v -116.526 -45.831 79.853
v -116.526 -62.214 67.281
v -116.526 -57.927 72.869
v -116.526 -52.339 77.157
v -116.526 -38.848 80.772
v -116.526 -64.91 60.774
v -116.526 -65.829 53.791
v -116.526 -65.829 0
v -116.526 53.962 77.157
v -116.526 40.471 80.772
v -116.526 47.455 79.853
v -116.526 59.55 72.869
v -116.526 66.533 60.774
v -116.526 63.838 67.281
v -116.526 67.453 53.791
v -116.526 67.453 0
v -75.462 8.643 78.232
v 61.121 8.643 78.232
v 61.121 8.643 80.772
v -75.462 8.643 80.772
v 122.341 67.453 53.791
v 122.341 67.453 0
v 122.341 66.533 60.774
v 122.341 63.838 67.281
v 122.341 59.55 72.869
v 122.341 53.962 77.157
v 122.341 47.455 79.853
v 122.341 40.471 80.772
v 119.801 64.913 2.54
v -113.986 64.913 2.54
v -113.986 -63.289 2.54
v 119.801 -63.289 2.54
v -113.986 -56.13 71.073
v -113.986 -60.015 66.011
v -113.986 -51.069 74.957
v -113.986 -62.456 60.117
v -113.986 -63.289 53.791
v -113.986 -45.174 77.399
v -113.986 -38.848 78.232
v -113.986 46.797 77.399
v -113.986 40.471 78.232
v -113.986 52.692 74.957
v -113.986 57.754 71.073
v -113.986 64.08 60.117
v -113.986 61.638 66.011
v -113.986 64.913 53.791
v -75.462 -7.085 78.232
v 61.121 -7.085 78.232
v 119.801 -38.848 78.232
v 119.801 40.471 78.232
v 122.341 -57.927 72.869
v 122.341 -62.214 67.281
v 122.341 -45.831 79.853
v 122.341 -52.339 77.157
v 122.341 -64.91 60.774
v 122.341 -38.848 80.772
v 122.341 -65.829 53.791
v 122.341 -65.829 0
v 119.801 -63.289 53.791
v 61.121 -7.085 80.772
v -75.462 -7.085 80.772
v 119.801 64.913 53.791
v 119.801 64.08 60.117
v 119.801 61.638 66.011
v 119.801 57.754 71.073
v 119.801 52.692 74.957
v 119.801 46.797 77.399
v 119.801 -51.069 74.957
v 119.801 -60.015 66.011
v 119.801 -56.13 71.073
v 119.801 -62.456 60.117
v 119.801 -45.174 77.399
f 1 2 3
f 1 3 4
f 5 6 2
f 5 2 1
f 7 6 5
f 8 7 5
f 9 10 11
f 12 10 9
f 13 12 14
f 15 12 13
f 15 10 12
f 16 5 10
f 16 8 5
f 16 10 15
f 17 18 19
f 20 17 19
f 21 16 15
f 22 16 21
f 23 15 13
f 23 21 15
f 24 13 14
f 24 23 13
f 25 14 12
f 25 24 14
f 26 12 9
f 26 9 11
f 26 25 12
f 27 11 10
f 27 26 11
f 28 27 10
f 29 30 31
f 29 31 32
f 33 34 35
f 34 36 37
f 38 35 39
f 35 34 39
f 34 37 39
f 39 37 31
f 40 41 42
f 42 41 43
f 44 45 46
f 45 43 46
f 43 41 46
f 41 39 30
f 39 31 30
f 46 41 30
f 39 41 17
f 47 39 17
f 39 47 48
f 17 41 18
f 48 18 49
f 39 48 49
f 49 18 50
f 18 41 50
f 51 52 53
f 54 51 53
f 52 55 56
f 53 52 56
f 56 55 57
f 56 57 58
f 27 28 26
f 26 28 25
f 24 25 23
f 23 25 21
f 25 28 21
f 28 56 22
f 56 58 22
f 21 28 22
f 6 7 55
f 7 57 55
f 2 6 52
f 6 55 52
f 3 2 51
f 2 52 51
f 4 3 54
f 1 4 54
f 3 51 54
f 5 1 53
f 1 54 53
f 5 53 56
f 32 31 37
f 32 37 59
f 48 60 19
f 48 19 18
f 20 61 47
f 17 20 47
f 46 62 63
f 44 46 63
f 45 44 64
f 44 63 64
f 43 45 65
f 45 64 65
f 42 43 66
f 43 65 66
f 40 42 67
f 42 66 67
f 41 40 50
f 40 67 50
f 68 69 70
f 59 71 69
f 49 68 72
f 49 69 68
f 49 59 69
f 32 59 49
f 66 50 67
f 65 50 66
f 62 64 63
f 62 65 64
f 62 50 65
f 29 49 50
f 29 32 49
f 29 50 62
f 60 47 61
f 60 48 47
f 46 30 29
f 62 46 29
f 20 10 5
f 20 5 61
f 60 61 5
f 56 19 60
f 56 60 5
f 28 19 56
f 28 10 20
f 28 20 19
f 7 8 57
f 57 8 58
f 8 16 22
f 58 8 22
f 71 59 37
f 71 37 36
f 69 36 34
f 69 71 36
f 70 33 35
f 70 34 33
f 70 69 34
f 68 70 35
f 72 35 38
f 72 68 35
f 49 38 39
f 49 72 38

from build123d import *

# Parameters (mm, degrees)
F0_W     = 238.8670668006
F0_H     = 133.2817673683
F1_DEPTH = 80.772
F2_R     = 26.9812507731
F3_W     = 136.5834623575
F3_H     = 15.7284336165
F4_DEPTH = 15.748
F5_T     = 2.54


# Not quite as in the source:
# - a shell that OpenCascade refuses in one call is made with other operations: the cavity is built on its own and cut out


with BuildPart() as f1:
    # F0 (on Top) → F1 (new body)
    with BuildSketch(Plane.XY):
        with Locations((2.9073394835, 0.8117333055)):
            Rectangle(F0_W, F0_H)
    extrude(amount=F1_DEPTH)

    # F2
    f2_edges = [f1.edges().sort_by_distance(p)[0] for p in [
        (2.907339, -65.82915, 80.772),
        (2.907339, 67.452617, 80.772),
    ]]
    fillet(f2_edges, radius=F2_R)

    # F3 (on face) → F4 (join)
    with BuildSketch(Plane.XY.offset(80.772)):
        with Locations((-7.1703717113, 0.7790052332)):
            Rectangle(F3_W, F3_H)
    extrude(amount=F4_DEPTH)

    # F5: shell of thickness 2.54, made by hand


with BuildPart() as f5_core1:
    # F5_t2: copy of F1
    add(f1.part)

    # the walls: a layer under each face that stays
    f5_faces = [f5_core1.faces().sort_by_distance(p)[0] for p in [
        (2.9073394835, 67.4526169896, 26.8953746135),
        (122.3408728838, 0.8117333055, 40.386),
        (2.9073394835, 59.5499916031, 72.8693746135),
        (2.9073394835, 0.8117333055, 0),
        (-116.5261939168, 0.8117333055, 40.386),
        (2.9073394835, -65.8291503787, 26.8953746135),
        (2.9073394835, -57.9265249922, 72.8693746135),
        (-76.7150161167, -25.6280219686, 80.772),
    ]]
    thicken(f5_faces, amount=-F5_T, mode=Mode.SUBTRACT)


with BuildPart() as f1_1:
    add(f1.part)

    # what is left inside the walls is the cavity
    f5_cavity = [f5_core1.part.solids().sort_by_distance(p)[0] for p in [
        (2.907339, -20.555228, 2.5654),
    ]]
    add(f5_cavity, mode=Mode.SUBTRACT)


solid = f1_1.part
